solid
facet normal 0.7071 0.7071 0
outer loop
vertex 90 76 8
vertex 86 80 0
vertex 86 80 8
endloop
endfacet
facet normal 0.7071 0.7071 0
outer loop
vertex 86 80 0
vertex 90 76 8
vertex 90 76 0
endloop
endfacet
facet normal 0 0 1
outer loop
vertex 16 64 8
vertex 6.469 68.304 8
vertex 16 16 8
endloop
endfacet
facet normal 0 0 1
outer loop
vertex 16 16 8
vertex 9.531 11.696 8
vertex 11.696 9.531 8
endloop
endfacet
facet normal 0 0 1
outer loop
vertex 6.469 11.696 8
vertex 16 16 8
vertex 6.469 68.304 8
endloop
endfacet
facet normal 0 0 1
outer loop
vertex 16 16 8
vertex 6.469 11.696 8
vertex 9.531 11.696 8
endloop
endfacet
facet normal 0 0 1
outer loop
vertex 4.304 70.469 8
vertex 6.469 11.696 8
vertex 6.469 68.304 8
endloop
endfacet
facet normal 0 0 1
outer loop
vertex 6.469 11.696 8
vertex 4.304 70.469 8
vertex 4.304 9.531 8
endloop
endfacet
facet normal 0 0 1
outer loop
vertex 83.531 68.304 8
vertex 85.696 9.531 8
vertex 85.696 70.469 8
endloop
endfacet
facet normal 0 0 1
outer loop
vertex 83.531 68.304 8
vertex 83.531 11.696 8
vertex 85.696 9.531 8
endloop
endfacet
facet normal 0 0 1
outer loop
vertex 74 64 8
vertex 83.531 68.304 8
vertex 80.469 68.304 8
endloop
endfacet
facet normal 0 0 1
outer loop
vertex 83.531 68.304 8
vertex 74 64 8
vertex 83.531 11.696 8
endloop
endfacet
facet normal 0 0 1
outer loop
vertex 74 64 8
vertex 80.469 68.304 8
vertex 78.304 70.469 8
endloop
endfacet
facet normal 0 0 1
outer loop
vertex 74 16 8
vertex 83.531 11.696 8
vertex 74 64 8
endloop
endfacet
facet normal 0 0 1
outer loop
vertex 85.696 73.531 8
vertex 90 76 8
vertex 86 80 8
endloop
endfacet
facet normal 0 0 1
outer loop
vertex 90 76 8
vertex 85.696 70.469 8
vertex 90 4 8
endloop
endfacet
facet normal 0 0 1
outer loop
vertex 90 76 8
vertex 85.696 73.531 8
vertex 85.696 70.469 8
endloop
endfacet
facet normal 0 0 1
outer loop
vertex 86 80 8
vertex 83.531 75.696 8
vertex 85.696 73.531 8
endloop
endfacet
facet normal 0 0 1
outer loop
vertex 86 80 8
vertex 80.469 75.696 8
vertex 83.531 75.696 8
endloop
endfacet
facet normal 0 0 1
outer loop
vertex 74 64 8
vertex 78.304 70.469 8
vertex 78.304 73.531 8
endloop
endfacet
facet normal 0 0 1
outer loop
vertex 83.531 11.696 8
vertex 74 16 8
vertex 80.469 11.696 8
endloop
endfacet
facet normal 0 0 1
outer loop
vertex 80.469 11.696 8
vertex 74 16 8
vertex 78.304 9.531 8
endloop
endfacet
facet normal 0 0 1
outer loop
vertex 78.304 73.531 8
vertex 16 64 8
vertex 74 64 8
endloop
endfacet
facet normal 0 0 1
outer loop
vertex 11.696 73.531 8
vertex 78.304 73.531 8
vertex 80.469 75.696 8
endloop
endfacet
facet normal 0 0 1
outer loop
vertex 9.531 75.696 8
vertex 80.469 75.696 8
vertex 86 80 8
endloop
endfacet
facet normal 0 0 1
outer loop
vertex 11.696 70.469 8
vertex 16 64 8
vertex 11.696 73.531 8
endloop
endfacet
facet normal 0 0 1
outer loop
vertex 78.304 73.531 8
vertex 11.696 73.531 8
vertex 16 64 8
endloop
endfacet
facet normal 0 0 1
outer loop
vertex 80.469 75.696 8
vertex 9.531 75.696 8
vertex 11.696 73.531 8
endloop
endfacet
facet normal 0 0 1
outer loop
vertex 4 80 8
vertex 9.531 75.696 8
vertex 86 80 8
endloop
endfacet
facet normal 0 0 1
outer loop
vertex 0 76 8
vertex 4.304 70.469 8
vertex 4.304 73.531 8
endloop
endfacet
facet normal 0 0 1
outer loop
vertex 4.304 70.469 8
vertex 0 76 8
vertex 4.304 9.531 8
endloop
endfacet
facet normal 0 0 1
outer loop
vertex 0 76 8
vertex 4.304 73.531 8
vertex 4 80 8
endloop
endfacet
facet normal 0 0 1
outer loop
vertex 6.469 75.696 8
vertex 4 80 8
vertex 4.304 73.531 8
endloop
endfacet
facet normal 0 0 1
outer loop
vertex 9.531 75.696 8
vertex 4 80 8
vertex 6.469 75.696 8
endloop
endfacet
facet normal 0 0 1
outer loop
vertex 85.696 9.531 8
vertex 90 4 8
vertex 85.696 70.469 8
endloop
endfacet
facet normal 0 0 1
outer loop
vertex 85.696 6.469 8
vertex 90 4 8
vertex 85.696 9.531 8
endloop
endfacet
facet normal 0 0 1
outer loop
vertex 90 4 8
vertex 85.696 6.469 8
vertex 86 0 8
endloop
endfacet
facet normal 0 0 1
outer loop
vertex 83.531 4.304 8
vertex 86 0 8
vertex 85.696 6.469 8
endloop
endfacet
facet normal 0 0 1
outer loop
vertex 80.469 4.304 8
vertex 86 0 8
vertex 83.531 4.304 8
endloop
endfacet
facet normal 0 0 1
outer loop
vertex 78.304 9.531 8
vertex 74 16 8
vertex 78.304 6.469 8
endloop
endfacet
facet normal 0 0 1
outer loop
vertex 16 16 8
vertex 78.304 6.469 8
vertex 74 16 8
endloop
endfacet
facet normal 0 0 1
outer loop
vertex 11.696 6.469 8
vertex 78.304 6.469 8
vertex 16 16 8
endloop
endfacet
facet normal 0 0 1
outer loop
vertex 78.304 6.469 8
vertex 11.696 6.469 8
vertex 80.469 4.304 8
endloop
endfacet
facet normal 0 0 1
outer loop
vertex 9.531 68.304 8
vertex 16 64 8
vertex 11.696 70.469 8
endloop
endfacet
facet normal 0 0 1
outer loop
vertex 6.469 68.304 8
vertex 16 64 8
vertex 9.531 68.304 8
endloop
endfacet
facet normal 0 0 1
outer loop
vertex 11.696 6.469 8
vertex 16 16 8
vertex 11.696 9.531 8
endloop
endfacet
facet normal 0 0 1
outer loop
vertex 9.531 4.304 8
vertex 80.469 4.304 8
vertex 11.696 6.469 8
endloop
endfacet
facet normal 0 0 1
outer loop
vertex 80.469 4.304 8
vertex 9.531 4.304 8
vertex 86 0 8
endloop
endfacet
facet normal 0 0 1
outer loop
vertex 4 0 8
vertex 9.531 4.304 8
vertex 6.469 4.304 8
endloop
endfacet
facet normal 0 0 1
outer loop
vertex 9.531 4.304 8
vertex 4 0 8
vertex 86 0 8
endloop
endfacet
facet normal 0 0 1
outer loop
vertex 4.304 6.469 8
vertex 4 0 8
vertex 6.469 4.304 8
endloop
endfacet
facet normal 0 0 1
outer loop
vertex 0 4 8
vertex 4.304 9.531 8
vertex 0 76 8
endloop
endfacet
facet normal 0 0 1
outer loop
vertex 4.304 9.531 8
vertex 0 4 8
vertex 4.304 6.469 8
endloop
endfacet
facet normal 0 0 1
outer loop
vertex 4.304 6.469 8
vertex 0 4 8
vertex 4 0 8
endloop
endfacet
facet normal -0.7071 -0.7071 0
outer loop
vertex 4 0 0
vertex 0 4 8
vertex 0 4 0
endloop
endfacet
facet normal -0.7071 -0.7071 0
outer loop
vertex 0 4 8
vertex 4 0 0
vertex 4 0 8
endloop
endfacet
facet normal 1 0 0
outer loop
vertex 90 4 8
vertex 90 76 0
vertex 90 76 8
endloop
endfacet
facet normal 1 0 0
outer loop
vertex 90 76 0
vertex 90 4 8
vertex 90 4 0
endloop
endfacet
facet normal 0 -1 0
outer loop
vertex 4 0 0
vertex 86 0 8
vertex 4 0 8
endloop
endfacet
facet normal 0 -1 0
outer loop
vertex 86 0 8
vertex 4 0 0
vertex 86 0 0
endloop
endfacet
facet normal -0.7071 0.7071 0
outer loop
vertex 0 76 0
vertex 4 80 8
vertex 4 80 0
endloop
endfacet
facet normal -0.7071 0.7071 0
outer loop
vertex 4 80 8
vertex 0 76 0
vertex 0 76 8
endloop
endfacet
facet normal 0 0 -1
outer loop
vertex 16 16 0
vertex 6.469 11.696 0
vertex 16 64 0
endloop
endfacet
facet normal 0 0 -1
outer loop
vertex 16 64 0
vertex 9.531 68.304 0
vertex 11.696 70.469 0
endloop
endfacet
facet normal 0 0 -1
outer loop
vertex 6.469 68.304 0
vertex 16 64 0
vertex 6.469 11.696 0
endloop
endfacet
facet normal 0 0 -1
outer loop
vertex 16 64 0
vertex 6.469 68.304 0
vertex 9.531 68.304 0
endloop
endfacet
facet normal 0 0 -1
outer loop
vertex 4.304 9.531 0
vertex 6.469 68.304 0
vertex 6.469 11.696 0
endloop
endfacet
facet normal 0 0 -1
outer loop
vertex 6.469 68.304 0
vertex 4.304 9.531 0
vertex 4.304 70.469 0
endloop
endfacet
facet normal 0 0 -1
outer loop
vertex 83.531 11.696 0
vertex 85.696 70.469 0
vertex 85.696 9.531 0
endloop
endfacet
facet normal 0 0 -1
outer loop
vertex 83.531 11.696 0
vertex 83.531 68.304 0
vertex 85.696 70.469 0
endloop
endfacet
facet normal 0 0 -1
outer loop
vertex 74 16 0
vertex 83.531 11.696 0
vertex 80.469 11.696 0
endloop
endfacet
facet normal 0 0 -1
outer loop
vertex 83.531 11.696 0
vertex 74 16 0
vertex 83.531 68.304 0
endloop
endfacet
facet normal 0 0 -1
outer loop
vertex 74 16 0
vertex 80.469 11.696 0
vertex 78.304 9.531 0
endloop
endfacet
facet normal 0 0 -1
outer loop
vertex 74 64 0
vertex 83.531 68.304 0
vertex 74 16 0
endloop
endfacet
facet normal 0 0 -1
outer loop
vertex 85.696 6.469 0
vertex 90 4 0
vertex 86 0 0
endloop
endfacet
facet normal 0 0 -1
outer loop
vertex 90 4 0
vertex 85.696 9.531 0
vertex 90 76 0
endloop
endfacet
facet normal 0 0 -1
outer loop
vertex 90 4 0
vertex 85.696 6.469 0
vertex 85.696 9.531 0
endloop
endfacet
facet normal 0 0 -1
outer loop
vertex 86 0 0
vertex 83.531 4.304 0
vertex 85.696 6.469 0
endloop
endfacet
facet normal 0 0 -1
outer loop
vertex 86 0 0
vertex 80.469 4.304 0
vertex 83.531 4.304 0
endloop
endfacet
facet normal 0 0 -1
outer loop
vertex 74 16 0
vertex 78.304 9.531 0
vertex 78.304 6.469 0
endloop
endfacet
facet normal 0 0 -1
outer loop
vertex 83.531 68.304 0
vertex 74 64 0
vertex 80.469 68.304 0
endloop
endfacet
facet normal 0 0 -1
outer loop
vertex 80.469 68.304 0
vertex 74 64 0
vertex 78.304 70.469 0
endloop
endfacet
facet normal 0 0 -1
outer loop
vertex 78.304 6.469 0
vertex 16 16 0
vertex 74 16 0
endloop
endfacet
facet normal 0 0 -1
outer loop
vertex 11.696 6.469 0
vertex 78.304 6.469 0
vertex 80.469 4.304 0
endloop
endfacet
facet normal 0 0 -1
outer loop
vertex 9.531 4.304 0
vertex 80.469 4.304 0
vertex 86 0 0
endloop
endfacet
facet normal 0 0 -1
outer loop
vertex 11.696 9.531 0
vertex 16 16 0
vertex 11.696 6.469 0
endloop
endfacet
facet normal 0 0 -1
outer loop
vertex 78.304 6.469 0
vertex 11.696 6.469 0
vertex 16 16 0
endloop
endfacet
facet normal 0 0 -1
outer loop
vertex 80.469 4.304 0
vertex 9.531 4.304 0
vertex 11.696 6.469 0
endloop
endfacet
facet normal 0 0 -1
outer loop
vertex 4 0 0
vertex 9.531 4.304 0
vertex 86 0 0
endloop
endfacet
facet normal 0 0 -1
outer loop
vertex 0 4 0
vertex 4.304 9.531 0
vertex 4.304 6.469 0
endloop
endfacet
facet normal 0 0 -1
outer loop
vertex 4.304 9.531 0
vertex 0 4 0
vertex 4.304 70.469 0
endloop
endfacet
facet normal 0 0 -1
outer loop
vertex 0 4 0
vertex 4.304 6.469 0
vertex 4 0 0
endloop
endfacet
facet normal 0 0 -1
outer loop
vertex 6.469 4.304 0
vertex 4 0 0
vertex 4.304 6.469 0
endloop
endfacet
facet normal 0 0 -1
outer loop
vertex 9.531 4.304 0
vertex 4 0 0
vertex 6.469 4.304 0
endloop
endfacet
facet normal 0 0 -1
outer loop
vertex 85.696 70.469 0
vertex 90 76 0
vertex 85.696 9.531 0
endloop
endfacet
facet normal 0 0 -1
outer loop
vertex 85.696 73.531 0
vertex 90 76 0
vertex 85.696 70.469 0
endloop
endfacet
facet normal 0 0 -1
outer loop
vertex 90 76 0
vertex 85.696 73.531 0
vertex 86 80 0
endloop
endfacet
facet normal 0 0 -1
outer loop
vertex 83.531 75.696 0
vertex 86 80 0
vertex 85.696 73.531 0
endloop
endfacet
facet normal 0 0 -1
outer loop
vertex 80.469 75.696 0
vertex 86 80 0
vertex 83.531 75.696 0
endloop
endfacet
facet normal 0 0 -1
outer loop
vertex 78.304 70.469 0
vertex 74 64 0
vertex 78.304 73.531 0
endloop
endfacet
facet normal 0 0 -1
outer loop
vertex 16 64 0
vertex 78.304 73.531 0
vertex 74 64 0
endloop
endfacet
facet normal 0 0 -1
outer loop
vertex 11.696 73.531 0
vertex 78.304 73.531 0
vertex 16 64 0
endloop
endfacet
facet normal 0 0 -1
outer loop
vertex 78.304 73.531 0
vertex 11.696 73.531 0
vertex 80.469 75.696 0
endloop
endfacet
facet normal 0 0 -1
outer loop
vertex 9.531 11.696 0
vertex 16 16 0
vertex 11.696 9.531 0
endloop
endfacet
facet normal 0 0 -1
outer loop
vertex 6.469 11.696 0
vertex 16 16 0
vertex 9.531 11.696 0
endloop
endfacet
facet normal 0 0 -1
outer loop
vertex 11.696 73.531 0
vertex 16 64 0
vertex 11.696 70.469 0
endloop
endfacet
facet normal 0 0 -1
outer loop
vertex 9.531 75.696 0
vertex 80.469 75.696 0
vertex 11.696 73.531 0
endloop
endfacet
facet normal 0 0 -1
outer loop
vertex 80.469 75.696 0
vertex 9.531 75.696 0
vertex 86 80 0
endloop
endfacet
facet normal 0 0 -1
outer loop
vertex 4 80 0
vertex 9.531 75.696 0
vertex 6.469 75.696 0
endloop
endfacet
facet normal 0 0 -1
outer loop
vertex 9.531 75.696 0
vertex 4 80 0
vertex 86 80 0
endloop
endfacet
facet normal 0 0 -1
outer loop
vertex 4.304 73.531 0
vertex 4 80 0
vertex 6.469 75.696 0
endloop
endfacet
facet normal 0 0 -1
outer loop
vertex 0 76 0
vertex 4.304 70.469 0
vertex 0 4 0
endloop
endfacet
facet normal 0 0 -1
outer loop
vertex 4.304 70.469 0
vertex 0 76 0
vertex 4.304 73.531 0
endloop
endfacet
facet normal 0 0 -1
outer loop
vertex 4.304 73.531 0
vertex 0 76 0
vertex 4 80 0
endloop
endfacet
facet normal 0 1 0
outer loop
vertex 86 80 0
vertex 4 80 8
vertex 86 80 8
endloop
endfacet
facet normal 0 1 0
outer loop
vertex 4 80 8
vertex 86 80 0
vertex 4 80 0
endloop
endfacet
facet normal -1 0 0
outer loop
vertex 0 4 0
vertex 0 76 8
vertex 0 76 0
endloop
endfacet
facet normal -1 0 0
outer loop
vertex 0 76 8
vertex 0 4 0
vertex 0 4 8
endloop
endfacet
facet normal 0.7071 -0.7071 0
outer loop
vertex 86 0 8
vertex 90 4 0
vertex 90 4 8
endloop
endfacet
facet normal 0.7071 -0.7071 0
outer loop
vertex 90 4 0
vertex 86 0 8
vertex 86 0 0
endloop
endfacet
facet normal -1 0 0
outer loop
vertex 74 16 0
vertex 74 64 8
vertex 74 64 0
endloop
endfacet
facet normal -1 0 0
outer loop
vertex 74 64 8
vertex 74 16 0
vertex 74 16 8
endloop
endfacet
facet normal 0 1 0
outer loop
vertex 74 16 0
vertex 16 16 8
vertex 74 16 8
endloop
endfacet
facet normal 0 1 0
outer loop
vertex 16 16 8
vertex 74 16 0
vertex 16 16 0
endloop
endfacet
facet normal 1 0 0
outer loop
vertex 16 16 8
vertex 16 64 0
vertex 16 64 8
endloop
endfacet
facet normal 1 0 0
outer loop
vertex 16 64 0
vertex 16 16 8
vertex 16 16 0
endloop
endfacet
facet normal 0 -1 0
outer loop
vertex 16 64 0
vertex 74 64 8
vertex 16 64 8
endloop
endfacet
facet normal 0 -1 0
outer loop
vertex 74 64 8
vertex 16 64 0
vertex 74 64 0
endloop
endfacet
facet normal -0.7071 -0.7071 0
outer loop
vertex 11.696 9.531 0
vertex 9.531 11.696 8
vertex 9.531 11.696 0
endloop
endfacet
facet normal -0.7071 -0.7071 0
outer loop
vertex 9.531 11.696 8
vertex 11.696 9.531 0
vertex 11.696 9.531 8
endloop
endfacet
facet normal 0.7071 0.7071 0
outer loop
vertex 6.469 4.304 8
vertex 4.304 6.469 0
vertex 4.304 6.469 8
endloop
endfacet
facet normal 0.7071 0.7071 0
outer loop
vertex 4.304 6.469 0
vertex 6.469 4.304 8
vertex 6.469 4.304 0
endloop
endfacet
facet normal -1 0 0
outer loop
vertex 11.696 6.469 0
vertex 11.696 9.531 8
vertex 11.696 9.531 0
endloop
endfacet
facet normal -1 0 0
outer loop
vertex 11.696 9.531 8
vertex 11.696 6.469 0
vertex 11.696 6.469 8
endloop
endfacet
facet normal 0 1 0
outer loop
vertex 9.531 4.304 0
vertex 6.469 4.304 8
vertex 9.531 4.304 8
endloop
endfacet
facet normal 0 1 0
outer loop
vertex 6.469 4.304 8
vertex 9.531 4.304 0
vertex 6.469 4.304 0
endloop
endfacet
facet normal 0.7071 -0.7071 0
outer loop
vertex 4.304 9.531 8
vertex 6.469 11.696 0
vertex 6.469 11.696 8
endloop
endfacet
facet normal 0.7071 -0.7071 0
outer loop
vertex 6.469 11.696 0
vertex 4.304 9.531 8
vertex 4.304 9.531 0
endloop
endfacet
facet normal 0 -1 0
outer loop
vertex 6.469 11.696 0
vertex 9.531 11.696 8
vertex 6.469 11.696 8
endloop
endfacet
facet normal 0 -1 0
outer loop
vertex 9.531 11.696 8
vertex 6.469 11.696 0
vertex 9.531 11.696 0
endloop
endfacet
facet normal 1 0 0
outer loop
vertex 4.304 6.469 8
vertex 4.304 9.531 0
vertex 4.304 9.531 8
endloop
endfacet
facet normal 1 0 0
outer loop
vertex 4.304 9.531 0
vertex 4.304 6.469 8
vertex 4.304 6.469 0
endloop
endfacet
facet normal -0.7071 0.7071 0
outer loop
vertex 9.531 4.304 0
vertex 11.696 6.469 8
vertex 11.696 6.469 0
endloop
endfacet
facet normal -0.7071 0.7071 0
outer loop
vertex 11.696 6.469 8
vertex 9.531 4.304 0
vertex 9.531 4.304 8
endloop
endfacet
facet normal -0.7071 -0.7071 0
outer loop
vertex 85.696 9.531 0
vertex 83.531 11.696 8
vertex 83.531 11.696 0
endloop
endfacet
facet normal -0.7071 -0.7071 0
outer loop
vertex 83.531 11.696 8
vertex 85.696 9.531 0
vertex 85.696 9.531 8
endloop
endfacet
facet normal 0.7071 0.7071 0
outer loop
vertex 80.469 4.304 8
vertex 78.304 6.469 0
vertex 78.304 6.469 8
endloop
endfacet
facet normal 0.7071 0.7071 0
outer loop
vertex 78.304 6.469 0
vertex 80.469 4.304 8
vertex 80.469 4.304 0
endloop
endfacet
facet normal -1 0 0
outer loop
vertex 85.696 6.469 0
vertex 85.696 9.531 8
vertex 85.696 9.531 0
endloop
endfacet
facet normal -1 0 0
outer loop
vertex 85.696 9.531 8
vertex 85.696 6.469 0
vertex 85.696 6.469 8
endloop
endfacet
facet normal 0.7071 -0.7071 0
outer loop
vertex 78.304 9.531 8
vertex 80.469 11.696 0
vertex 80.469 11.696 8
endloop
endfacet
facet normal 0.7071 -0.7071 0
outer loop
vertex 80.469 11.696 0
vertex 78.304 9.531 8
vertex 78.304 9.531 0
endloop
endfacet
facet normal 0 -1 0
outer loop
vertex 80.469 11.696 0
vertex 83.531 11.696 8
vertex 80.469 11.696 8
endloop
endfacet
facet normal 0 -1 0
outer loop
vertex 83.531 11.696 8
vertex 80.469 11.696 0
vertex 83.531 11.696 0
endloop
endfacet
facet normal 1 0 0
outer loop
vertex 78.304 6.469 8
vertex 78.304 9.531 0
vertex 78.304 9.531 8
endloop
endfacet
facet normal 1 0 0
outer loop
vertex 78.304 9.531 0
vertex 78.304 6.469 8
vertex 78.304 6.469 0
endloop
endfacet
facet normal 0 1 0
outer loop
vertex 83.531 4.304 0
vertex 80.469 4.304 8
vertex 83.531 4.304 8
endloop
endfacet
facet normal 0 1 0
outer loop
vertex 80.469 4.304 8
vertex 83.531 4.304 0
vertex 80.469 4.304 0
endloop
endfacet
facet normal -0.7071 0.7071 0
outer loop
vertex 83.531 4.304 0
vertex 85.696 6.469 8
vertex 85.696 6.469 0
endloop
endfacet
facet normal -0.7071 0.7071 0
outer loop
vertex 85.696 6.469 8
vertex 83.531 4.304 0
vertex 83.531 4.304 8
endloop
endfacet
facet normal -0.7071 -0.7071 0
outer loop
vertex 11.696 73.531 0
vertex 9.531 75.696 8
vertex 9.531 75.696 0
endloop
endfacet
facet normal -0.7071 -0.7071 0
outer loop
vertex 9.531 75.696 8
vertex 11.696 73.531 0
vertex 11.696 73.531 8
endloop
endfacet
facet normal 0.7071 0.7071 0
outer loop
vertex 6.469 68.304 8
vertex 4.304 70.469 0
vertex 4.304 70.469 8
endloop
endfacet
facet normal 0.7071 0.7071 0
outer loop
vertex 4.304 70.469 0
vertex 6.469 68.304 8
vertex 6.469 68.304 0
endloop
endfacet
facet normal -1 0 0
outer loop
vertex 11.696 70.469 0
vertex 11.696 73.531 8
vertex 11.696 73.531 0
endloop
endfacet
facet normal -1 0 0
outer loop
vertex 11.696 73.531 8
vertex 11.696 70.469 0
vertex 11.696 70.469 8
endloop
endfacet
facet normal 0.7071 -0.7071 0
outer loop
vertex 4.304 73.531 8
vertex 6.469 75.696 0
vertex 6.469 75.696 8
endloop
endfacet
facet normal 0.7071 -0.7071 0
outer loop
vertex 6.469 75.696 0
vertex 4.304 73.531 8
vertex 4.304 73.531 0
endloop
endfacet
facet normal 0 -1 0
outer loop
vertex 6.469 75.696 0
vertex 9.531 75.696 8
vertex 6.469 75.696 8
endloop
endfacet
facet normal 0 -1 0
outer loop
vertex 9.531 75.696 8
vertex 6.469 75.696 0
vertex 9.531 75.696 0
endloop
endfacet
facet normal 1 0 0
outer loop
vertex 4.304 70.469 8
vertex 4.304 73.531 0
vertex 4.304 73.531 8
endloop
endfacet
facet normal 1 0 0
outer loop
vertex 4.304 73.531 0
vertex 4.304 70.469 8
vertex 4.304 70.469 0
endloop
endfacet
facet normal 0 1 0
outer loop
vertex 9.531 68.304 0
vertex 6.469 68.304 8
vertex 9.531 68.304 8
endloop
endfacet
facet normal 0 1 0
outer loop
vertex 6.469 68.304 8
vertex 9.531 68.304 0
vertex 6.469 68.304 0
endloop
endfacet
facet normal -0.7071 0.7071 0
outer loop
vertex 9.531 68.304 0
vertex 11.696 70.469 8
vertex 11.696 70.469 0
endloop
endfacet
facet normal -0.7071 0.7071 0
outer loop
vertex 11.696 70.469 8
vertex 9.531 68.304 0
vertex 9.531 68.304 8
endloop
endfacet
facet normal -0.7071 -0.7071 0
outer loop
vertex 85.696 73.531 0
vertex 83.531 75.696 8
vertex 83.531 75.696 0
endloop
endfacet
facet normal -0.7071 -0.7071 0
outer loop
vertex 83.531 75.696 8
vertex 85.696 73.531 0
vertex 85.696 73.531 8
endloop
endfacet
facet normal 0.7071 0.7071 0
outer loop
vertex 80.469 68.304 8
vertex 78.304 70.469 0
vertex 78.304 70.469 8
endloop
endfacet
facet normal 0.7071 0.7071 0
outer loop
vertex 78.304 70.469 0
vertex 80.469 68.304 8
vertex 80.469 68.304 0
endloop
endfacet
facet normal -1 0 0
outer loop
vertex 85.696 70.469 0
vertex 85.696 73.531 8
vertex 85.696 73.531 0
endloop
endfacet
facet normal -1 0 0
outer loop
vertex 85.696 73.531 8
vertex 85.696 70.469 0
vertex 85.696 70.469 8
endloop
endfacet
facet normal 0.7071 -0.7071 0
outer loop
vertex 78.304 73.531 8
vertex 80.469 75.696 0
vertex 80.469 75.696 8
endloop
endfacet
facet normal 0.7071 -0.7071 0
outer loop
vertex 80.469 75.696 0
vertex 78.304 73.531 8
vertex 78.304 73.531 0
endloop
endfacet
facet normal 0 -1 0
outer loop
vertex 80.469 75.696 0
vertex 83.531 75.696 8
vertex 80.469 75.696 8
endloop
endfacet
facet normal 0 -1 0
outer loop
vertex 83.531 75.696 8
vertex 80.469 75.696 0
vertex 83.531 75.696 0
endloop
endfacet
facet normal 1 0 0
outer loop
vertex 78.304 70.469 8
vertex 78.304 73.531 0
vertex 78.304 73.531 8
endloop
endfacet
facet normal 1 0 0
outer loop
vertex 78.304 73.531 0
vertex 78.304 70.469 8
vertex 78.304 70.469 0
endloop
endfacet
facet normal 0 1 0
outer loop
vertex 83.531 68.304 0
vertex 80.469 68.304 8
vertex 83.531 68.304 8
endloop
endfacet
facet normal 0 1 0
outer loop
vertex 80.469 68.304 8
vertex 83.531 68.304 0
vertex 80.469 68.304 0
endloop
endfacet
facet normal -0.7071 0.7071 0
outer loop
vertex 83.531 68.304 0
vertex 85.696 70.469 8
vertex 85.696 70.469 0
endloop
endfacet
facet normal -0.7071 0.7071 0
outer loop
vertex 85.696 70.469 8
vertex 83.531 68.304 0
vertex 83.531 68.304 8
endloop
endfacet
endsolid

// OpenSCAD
$fn = 32;

// ----------------------------------------------------------------------
// Frame plate: 90 x 80 frame, 16 mm rails
// ----------------------------------------------------------------------

// --- parameters (mm) ---
plate_l = 90;             // plate length, X
plate_w = 80;             // plate width, Y
plate_t = 8;              // plate thickness, Z (extrusion height)
corner_c = 4;             // corner chamfer
frame_bar = 16;           // frame rail width
bolt_r = 4;               // corner bolt window radius
bolt_inset = 8;           // bolt centre inset from the edges

win_l = plate_l - 2 * frame_bar;  // window length
win_w = plate_w - 2 * frame_bar;  // window width
bolt_d = 2 * bolt_r;  // corner hole diameter

profile = [[4, 0], [86, 0], [90, 4], [90, 76], [86, 80], [4, 80], [0, 76], [0, 4]];  // primary outline, 8 points, counter clockwise
void_1 = [[16, 16], [74, 16], [74, 64], [16, 64]];  // the window, 4 points
void_2 = [[11.696, 9.531], [9.531, 11.696], [6.469, 11.696], [4.304, 9.531], [4.304, 6.469], [6.469, 4.304], [9.531, 4.304], [11.696, 6.469]];  // corner bolt window, 8 points
void_3 = [[85.696, 9.531], [83.531, 11.696], [80.469, 11.696], [78.304, 9.531], [78.304, 6.469], [80.469, 4.304], [83.531, 4.304], [85.696, 6.469]];  // corner bolt window, 8 points
void_4 = [[11.696, 73.531], [9.531, 75.696], [6.469, 75.696], [4.304, 73.531], [4.304, 70.469], [6.469, 68.304], [9.531, 68.304], [11.696, 70.469]];  // corner bolt window, 8 points
void_5 = [[85.696, 73.531], [83.531, 75.696], [80.469, 75.696], [78.304, 73.531], [78.304, 70.469], [80.469, 68.304], [83.531, 68.304], [85.696, 70.469]];  // corner bolt window, 8 points

// --- the one profile operation ---
difference() {
  linear_extrude(height = plate_t) polygon(points = profile);
  translate([0, 0, -1])
    linear_extrude(height = plate_t + 2) polygon(points = void_1);
  translate([0, 0, -1])
    linear_extrude(height = plate_t + 2) polygon(points = void_2);
  translate([0, 0, -1])
    linear_extrude(height = plate_t + 2) polygon(points = void_3);
  translate([0, 0, -1])
    linear_extrude(height = plate_t + 2) polygon(points = void_4);
  translate([0, 0, -1])
    linear_extrude(height = plate_t + 2) polygon(points = void_5);
}
